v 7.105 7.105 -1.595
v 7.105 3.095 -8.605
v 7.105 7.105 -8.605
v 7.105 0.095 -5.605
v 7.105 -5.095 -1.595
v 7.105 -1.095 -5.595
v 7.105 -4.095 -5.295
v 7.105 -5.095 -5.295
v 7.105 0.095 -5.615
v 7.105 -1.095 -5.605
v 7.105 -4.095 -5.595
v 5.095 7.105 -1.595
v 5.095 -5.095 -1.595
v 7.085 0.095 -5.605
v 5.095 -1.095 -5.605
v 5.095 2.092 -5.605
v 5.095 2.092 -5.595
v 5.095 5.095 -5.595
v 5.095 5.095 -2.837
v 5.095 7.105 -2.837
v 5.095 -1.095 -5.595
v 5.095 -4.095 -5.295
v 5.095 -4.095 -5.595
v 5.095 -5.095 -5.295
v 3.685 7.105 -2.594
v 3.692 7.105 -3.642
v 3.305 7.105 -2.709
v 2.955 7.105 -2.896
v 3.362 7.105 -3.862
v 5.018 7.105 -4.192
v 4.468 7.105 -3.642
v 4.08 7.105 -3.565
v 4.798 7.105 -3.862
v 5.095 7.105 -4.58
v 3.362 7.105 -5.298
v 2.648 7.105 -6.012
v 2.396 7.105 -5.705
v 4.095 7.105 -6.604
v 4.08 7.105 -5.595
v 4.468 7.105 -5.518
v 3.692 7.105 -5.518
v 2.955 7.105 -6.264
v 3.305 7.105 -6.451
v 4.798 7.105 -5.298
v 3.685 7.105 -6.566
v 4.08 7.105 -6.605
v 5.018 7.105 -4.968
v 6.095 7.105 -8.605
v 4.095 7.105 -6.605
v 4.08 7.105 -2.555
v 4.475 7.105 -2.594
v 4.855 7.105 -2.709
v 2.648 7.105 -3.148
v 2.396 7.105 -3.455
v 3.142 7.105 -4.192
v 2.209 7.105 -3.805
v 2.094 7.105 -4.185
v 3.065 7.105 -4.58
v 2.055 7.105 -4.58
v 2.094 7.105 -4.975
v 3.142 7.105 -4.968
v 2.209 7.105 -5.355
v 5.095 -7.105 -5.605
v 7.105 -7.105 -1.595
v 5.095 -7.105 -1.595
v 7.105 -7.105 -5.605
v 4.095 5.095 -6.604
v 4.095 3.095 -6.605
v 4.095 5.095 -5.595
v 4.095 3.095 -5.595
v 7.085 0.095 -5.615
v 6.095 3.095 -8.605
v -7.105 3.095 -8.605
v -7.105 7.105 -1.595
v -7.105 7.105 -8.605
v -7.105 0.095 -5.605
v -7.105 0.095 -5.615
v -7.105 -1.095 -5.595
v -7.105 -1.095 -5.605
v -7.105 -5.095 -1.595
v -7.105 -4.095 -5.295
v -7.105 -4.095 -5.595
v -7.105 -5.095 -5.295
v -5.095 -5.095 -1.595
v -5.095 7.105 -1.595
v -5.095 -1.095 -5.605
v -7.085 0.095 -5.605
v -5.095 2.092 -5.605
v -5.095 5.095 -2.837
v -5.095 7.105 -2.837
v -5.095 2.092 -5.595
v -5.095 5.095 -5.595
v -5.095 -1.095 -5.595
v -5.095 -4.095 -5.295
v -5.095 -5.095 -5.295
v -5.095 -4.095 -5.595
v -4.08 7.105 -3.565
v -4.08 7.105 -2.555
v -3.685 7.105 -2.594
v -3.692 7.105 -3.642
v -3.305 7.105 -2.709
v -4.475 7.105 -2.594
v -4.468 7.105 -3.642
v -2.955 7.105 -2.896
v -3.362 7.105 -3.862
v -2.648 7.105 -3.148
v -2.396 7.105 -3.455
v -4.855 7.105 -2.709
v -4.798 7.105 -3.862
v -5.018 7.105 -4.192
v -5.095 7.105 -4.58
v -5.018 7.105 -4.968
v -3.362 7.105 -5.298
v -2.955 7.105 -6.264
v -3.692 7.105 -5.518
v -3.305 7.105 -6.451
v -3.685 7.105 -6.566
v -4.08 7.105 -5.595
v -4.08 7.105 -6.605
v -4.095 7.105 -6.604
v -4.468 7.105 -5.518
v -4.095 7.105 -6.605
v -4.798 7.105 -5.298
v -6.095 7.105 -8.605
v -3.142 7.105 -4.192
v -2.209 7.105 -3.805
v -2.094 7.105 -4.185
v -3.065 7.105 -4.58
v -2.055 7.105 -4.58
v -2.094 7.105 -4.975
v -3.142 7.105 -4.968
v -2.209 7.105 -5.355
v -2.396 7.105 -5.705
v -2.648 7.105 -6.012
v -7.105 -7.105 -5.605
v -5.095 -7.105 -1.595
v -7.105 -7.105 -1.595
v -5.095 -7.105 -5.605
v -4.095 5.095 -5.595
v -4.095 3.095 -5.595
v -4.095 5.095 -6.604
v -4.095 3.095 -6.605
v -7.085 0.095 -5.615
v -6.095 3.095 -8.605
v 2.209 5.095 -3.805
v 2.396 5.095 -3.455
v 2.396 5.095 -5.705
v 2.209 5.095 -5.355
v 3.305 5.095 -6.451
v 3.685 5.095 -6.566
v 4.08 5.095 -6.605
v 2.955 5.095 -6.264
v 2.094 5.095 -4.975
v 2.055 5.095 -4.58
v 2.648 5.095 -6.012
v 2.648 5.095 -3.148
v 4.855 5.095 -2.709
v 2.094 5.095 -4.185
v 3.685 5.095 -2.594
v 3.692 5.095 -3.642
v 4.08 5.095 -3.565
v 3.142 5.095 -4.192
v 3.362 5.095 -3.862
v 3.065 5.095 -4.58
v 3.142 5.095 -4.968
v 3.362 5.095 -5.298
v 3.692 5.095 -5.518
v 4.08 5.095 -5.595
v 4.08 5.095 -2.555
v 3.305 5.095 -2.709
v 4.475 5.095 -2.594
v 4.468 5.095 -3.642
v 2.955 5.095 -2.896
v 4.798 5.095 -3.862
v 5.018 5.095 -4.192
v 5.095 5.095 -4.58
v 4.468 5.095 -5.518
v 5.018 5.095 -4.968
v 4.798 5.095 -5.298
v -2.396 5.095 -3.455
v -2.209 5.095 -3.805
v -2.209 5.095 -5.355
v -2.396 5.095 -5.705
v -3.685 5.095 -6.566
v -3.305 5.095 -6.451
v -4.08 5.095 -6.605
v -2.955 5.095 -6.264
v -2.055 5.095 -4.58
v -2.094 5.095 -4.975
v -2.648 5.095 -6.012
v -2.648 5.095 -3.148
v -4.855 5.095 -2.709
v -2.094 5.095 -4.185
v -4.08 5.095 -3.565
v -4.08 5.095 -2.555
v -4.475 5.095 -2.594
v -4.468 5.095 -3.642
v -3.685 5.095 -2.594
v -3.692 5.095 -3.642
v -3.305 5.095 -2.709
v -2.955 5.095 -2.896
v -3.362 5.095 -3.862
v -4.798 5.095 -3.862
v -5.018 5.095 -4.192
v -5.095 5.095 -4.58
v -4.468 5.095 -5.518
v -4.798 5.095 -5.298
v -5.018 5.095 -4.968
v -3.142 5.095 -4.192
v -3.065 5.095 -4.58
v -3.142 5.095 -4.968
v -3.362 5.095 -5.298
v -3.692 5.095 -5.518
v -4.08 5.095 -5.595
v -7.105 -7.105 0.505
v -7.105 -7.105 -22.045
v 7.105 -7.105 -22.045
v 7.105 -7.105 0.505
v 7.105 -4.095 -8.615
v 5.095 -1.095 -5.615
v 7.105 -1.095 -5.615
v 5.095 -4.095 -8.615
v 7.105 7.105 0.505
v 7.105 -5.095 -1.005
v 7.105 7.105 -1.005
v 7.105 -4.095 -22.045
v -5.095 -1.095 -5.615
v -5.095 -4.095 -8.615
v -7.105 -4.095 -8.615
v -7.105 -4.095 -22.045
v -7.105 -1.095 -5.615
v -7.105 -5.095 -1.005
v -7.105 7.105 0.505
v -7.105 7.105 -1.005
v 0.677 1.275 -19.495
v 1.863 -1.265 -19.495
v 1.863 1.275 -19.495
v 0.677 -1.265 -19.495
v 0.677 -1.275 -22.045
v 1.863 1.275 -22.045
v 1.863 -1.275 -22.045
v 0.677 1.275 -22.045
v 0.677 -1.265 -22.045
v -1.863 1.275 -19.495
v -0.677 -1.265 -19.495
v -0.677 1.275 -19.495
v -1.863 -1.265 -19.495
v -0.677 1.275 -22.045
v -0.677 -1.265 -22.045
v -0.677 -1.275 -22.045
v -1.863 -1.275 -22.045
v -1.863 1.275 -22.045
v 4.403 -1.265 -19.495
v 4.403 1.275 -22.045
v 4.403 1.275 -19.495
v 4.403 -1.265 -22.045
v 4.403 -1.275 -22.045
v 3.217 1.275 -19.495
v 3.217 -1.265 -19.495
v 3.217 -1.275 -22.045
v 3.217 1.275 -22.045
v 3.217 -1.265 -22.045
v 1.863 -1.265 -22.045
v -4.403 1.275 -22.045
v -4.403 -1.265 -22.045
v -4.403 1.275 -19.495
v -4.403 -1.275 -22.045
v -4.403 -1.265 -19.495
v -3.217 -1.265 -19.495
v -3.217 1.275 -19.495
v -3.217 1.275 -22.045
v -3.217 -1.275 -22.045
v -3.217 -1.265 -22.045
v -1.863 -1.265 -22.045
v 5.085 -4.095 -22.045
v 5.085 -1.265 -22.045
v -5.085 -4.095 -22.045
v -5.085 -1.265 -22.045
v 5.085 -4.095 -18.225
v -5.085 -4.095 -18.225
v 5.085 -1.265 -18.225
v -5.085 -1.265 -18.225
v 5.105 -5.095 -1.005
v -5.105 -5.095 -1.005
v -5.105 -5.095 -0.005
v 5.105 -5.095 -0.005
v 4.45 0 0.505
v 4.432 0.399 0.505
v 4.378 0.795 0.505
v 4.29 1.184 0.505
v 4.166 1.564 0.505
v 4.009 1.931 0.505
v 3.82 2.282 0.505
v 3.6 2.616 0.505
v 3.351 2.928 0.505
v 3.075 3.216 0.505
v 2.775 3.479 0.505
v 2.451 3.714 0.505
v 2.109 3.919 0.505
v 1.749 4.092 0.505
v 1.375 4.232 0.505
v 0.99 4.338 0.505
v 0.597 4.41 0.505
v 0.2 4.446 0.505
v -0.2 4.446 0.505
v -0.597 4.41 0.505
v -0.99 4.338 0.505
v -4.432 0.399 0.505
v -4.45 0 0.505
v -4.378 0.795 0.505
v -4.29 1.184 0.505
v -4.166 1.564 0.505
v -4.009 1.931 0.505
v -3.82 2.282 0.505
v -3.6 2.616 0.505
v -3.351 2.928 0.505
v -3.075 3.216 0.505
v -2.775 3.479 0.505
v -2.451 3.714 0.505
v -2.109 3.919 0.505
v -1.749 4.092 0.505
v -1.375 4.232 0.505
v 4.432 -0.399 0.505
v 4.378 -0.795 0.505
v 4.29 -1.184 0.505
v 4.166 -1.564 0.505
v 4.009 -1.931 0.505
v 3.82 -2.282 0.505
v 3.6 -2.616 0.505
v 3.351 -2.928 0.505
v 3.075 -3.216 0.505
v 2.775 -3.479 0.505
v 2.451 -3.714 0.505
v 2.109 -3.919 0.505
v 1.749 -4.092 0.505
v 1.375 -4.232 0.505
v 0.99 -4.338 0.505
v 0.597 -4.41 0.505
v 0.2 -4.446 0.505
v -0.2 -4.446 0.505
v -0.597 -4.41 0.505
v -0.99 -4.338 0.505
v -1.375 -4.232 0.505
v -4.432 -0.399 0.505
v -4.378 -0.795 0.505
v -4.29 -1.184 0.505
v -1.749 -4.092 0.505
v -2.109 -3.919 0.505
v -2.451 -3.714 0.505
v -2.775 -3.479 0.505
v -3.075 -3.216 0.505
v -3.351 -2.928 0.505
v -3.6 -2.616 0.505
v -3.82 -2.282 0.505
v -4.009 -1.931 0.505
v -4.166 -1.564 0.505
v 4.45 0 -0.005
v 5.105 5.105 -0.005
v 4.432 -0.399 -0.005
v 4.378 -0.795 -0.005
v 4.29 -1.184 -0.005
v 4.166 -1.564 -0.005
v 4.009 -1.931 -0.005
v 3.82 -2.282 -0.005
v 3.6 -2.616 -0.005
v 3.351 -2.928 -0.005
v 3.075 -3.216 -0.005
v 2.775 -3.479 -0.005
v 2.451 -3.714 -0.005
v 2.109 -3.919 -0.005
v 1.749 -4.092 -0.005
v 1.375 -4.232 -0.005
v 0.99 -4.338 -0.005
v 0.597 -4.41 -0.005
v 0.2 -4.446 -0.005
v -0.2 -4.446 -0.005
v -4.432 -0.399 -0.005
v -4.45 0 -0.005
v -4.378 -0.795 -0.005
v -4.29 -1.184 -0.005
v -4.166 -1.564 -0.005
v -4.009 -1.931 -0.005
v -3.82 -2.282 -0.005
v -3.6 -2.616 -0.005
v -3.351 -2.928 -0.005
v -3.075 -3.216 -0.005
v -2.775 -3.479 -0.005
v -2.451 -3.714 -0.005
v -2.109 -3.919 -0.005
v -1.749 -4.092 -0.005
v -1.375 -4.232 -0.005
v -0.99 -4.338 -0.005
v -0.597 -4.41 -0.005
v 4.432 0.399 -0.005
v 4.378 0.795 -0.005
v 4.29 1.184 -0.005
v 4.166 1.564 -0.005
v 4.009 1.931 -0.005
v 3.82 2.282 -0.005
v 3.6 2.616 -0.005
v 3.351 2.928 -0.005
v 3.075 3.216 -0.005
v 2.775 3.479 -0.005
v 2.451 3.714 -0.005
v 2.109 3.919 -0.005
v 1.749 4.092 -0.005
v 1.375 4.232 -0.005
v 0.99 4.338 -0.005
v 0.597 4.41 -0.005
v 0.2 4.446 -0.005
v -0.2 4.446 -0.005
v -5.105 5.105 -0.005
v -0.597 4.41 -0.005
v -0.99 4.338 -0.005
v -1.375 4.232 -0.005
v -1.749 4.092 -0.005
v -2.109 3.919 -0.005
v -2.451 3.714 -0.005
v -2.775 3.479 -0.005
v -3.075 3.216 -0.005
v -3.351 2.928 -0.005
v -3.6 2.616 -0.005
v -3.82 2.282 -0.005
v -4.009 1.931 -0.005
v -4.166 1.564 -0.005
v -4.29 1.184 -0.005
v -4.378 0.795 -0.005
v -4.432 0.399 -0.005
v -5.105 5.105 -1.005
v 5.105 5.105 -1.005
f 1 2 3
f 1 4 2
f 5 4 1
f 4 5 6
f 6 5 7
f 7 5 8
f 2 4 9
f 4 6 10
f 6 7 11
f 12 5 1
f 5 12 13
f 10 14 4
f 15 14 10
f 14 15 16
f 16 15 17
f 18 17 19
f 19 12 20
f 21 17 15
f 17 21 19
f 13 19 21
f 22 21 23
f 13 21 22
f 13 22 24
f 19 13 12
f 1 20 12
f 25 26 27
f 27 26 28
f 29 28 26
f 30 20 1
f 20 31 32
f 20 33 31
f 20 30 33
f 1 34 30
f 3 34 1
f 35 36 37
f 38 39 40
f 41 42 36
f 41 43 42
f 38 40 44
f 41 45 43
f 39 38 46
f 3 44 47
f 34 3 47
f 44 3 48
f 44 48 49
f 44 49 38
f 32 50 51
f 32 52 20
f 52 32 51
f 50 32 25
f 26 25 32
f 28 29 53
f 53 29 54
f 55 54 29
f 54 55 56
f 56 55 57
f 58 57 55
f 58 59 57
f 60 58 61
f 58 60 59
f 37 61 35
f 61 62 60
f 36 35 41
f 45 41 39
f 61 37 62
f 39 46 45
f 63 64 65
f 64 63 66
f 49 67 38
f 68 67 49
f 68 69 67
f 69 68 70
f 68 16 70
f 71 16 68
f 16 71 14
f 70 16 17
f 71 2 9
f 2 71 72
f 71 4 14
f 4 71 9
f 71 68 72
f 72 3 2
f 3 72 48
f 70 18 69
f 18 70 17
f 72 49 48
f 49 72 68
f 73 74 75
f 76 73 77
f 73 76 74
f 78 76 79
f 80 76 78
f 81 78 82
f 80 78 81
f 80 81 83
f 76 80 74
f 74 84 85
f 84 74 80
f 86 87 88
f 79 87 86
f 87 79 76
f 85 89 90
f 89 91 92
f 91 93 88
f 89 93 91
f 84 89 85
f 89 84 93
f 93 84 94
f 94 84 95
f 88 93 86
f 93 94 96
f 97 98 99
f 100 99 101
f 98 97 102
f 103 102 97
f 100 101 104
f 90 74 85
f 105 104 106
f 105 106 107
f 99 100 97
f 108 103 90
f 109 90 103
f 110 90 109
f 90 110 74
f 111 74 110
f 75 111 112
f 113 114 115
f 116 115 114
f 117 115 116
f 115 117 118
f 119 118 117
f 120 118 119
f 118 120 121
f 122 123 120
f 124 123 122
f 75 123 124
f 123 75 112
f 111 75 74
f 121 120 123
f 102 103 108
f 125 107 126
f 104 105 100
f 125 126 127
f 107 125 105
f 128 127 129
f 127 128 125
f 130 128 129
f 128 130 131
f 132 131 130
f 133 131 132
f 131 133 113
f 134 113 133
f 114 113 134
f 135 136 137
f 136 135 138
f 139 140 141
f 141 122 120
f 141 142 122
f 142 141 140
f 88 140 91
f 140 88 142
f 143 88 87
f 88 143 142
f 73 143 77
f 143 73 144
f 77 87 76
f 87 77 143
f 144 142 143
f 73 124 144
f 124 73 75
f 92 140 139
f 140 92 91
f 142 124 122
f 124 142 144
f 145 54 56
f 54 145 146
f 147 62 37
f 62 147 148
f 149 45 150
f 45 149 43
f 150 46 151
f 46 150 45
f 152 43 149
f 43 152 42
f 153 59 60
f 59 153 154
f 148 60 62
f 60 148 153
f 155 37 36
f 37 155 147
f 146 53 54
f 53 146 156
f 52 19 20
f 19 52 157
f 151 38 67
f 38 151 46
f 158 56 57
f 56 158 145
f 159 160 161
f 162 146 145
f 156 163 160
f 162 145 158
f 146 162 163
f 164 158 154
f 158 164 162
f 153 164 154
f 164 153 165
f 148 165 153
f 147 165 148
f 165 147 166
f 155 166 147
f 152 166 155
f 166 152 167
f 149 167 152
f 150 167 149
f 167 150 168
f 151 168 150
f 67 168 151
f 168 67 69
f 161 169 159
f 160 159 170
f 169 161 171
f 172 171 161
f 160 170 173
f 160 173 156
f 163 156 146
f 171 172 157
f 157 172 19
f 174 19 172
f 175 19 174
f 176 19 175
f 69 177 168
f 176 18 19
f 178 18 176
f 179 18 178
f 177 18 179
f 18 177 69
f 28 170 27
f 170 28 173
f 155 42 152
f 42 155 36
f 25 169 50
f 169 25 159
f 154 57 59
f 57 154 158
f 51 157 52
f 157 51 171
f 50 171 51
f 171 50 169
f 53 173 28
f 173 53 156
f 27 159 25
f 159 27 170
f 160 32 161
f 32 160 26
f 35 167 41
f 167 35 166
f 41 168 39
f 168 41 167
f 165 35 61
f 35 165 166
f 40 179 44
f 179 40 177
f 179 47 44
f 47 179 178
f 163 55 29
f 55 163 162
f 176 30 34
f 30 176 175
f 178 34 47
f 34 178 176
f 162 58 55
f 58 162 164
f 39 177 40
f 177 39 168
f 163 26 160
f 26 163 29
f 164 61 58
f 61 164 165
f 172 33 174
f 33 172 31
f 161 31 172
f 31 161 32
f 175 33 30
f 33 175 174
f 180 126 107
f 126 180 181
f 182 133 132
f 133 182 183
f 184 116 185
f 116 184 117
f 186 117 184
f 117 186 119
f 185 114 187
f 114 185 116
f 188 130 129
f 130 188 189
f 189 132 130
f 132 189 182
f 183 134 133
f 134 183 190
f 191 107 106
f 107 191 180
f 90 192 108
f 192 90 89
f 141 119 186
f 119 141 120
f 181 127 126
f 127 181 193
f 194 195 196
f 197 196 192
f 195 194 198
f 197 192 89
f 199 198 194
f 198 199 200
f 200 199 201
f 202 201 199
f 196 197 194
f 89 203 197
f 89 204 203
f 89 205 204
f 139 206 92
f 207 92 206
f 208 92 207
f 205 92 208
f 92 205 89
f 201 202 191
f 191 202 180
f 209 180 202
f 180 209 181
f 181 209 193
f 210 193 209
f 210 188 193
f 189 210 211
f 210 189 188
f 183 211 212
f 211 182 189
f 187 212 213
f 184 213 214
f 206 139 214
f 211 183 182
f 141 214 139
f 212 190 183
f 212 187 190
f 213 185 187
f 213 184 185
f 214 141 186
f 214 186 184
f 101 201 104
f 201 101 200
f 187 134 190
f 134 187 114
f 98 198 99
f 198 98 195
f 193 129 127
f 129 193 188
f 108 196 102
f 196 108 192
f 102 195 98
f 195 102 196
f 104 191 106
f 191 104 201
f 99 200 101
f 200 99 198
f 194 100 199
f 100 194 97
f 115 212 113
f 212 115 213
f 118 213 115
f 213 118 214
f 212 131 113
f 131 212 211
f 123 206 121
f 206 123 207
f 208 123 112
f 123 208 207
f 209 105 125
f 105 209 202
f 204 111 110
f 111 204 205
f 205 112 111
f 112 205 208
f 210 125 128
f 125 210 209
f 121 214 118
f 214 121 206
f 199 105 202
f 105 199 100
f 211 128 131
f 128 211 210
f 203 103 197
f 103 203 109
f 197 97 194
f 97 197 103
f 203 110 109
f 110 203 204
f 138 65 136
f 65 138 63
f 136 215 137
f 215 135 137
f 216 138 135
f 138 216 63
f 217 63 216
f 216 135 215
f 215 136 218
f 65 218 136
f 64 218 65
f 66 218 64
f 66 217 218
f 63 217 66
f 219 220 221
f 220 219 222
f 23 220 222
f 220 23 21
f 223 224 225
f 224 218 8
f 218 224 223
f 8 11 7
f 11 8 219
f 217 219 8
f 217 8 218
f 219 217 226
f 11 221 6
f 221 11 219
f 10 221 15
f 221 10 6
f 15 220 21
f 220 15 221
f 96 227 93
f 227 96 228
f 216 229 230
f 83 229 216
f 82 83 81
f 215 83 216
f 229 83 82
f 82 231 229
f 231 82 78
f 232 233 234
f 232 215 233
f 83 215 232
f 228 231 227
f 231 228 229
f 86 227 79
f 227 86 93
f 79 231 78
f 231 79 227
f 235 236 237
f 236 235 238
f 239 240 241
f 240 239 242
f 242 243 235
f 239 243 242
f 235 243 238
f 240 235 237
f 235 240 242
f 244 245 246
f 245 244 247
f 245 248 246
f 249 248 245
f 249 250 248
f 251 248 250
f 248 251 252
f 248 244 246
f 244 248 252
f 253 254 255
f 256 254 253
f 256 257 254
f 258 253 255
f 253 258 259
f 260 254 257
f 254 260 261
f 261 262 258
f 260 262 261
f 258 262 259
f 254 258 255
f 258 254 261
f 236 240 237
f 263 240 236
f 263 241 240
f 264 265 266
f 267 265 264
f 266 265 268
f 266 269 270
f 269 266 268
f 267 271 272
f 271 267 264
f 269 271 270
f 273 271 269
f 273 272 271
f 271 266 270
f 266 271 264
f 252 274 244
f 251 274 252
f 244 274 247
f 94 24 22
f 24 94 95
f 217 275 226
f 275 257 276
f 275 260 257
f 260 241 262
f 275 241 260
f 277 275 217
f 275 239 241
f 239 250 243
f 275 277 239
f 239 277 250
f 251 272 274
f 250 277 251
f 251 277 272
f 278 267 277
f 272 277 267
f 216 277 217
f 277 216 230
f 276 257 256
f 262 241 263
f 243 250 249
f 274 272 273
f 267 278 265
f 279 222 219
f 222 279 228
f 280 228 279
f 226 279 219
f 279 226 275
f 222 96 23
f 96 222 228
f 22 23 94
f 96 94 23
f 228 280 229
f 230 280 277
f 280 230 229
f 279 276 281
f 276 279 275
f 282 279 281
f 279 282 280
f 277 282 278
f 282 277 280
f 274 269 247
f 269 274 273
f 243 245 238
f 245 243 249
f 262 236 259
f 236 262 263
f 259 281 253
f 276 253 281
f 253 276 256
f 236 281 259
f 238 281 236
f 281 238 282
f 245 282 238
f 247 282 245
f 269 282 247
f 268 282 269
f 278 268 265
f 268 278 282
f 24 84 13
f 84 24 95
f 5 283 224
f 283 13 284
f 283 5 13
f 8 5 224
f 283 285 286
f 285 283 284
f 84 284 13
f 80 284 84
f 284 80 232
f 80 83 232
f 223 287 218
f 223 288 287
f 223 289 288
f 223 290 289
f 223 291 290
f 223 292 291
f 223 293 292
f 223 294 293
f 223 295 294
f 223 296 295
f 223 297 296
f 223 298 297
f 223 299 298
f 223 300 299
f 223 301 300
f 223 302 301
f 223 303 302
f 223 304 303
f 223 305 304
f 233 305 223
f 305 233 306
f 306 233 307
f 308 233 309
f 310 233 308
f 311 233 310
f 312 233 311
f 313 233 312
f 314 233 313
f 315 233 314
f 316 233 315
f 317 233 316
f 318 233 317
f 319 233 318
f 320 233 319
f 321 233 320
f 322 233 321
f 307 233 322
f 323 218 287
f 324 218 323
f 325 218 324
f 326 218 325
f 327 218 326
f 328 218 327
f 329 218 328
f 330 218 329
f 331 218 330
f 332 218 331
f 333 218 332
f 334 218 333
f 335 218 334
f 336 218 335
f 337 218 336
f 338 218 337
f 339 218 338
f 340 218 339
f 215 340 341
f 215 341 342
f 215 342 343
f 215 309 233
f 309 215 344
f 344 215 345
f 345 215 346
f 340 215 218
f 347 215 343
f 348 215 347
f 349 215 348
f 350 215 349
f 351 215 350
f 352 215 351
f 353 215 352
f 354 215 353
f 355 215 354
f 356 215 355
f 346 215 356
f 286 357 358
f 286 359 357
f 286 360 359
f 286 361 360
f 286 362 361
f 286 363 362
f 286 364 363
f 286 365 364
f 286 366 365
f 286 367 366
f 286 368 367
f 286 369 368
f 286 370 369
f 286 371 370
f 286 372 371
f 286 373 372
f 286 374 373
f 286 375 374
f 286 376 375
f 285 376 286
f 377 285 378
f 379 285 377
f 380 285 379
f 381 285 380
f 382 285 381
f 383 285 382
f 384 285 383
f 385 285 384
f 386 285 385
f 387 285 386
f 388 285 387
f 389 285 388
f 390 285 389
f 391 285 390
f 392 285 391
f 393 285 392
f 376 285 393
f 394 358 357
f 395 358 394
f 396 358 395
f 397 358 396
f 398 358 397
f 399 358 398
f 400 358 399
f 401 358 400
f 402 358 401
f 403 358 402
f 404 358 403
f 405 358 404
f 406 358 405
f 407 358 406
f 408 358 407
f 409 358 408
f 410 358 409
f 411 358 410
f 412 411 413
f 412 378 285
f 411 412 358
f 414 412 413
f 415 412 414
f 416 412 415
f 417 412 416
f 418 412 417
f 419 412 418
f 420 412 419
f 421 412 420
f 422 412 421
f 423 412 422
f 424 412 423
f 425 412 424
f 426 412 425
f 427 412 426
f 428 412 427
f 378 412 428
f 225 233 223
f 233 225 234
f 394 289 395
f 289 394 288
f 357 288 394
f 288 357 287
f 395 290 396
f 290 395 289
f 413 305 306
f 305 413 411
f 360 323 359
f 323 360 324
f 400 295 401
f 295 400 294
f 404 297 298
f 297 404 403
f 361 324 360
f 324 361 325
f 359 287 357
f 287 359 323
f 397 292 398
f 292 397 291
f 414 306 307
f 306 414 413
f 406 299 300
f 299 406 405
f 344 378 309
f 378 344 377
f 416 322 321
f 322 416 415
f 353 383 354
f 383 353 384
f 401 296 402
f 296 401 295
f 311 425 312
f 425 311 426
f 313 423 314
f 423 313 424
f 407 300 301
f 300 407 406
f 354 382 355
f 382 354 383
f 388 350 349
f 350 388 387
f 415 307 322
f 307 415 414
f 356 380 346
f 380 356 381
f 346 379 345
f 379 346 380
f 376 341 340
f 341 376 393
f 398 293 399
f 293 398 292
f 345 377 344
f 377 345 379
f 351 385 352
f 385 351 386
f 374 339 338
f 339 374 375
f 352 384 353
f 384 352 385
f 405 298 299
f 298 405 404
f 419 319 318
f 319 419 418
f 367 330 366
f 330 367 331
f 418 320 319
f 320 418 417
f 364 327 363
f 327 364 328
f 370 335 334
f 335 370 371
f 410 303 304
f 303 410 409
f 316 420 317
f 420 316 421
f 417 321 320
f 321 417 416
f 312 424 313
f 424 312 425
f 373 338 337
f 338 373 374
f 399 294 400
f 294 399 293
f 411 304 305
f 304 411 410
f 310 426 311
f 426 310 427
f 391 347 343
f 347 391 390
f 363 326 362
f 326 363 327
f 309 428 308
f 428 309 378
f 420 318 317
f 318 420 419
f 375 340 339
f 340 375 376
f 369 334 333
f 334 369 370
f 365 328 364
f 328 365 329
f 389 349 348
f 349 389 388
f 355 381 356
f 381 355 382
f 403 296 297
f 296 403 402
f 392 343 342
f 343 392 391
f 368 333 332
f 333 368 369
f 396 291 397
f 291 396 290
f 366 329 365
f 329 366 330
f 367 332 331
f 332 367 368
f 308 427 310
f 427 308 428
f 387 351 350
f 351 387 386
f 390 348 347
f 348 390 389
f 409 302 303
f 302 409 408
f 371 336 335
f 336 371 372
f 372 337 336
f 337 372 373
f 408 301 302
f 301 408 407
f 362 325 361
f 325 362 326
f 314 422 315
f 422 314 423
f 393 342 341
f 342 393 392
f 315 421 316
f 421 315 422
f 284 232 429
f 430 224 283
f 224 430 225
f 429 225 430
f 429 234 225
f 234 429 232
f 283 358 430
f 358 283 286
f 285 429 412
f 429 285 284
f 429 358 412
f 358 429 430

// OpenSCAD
// file: vector_operations.scad
/*

    Make up for the lack of common vector operations.

    Usage:

        use <vector_operations.scad>

*/

module end_of_customization() {}

show_name = false;
if (show_name) {
    linear_extrude(2) text("vector_operations.scad", halign="center");
}

// Cumulative sum of values in v
function v_cumsum(v) = [for (a = v[0]-v[0], i = 0; i < len(v); a = a+v[i], i = i+1) a+v[i]];
    
function v_sum(v, i=0, r=0) = i<len(v) ? v_sum(v, i+1, r+v[i]) : r;

function v_add_scalar(v, s) = [ for (e = v) e + s ];
    
function v_sub_scalar(v, s) = [ for (e = v) e - s ];
    
function v_mul_scalar(v, s) = [ for (e = v) e * s ];

// The add operation is reasonably as the + operator in the language itself. 
 

function a2_add_scalar(a, s) = [ for (ae = a) v_add_scalar(ae, s) ];

// Array should be rectangular, with the same number
// of elements in each contained list.  
// That makes it different from a generic C style lists of list.
function array_transpose(a) = 
    [ for (j = [0 : 1 : len(a[0])-1]) 
        [ for (i =[0 : 1 : len(a)-1])
          a[i][j]  
        ]
    ];
        
        
module test_array_transpose() {
    a = [["cat1", "dog1"],
         ["cat2", "dog2"]]; 
    * echo("a", a);
    * echo("aT", array_transpose(a));
}

* test_array_transpose();

//Hadamard Product - - a & b must be same dimensioon
function v_o_dot(v_a, v_b) = 
    assert(len(v_a) == len(v_b), str("len(v_a)=", len(v_a), "len(v_b)=", len(v_b)))
    [ for (i = [0 : len(v_a)-1]) v_a[i] * v_b[i] ];


         
// file: centerable.scad
use <vector_operations.scad>


function bw_lshift(number, places) = 
    number * pow(2, places);
    
function bw_rshift(number, places) = 
    floor(number / pow(2, places));
    
function bw_extract(number, places, bits) = 
    bw_rshift(number, places) % pow(2, bits);

// A bit less brain-damaged primative shapes

CENTER = 0;   
PLUS = 1;
MINUS = 2;

FRONT = 1;
BEHIND = 2; 
RIGHT = 4;
LEFT =  8;    
ABOVE = 16;
BELOW = 32;
SIDEWISE = 64;

X_AXIS = 128;
Y_AXIS = 256;
Z_AXIS = 512;

_X_BITS = [0, 2];
_Y_BITS = [2, 2];
_Z_BITS = [4, 2];
_O_BITS = [6, 1];

_XYZO_BITMAP = [_X_BITS, _Y_BITS, _Z_BITS, _O_BITS];

function _number_to_bitvector(number) = [ 
    for (i = [0:3]) let(places = _XYZO_BITMAP[i][0], bits = _XYZO_BITMAP[i][1]) 
       bw_extract(number, places, bits) 
];
    

function _bv_to_sign(bv) = [
    for (i = [0:len(bv)]) 
        bv[i] == PLUS ? 1 :
        bv[i] == MINUS ? -1 : 0
];
    

function _center_to_dv(center, s, bv) = [
    for (i = [0:len(s)-1]) s[i] * bv[i]
];
    
function _center_to_displacement(center, size) = 
    _center_to_dv(
        center, 
        v_mul_scalar(size, 0.5),
        _bv_to_sign(_number_to_bitvector(center))); 

function _rotation_to_angles(angles) = 
    let(
         bv = v_shorten(_number_to_bitvector(angles), 3),
         signs = _bv_to_sign(bv),
         // signs = [FRONT|BEHIND, RIGHT|LEFT, ABOVE|BELOW]
         // A sign of zero for FRONT|BEHIND is treated as FRONT
         rotation = 
            [0, 0, signs[0] == 1 ? 0 :  signs[0] == -1 ? 180: 0] + 
            v_mul_scalar([0, 0, 90], signs[1]) + 
            v_mul_scalar([0, -90, 0], signs[2])
    )
    rotation;

function _rotate_size(size, rotation) =
    is_undef(rotation) ? size :
    rotation==LEFT ? [size.y, size.x, size.z] :
    assert(false);


module center_translation(size, center, rotation) {
    size_for_disp = _rotate_size(size, rotation); 
    disp = _center_to_displacement(center, size_for_disp);
    translate(disp) { 
        children();
    }
}

module center_rotation(rotation) {
    angles = _rotation_to_angles(rotation);
    rotate(angles) {
        children();
    }

}

module center_rotate(from_axis, to_axis) {
    assert(from_axis == Z_AXIS, "Not implemente yet");
    rotation =
       to_axis == X_AXIS ? [0, -90, 0] :
       to_axis == Y_AXIS ? [0, 0, 0] :
       to_axis == Z_AXIS ? [0, 0, 0] :
       assert(false);
       


    rotate(rotation) {
        children();
    }
}


module center_reflect(v) {
    assert(!is_undef(v), "You must pass an mirroring argument to center_reflect()");
    children();
    mirror(v) children();
}


function center_str_to_center(center_as_str) = 
    center_as_str == "RIGHT" ? RIGHT :
    center_as_str == "LEFT" ? LEFT :
    center_as_str == "FRONT" ? FRONT :    
    center_as_str == "BEHIND" ? BEHIND :
    center_as_str == "ABOVE" ? ABOVE :
    center_as_str == "BELOW" ? BELOW :
    assert(false, "Not implemented");
  
// file: logging.scad
/*

Features:
    * Larger font size since the console window font size can't be changed from GUI.
    * Color coding of message.
    * Prettier printing of vectors by rows..
    * Control of output level from customizer
    * Structured to encourage labeling output.

Usage:

include <lib/logging.scad>

The logging level constants are:

*/

CRITICAL = 50 + 0; 
FATAL = CRITICAL + 0;
ERROR = 40 + 0;
WARNING = 30 + 0;
WARN = WARNING + 0;
INFO = 20 + 0;
DEBUG = 10 + 0;
NOTSET = 0 + 0;

/*

    
Add this to your customizer section:   

*/

/* [Logging] */

log_verbosity_choice = "INFO"; // ["WARN", "INFO", "DEBUG"]
verbosity = log_verbosity_choice(log_verbosity_choice);    

/*  

Sample usage in code: 
    // DEBUG level assigned by default!
    log_s("air_brush_length", air_brush_length, verbosity);  
    
    // Really show this message because its important for immediately debugging
    log_s("air_brush_length", air_brush_length, verbosity, IMPORTANT);
   
    // Info message for aid in isolating a problem:
    log_s("Entering module", "module_name", verbosity, INFO);
    
    // Not a fatal error, but something the user should immediately 
    // spot in the log:
    log_s("Warning", "Message about the worry!", verbosity, WARN);
    
    // Show an array with somewhat prettier printing:
    log_v1("offsets", offsets, verbosity);
    
    // Dump out information relevant to an assertion failure
    if (assertion_condition) {
        log_v1("offsets", offsets, verbosity), ERROR);
        assert(assertion_condition, "msg")
    }
    
    warn(
        lp >= 2.5*h, 
        
        "Pintle length should be at least 2.5 times the height.",
        "The length is not sufficient to correctly implement rotation stops."
    );
    
*/


module end_of_customization() {}




show_name = false;
if (show_name) {
    linear_extrude(2) text("logging.scad", halign="center");
}


IMPORTANT = 25 + 0;


function console_styling(level) =
    level >= WARNING ?
        "<b style='background-color:LightSalmon'><font size='+1'>" : 
    level >= IMPORTANT ? 
        "<b style='color:OrangeRed'><font size='+2\'>" :
    // otherwise
        "<font size=\"+2\">";

function log_verbosity_choice(choice) = 
    choice == "WARN" ? WARN :
    choice == "INFO" ? INFO : 
    choice == "DEBUG" ? DEBUG : 
    NOTSET;
 
 
function log_s(label, s, verbosity, level=DEBUG, important=0) = 
    let(
        overridden_level = max(level, important),
        style = console_styling(overridden_level), 
        dmy1 = overridden_level >= verbosity ? echo (style, label, s) : undef
        
    )
    undef;
    
    
module log_s(label, s, verbosity, level=INFO, important=0) {
    overridden_level = max(level, important);
    if (overridden_level >= verbosity) { 
        style = console_styling(overridden_level);
        echo(style, label, s);
    }
}


function log_v1_styled(label, v1, style_level) = 
    let (
        style = console_styling(style_level),
        dummy1 = echo(style, "---"),
        dummy2 = echo(style, label, "= ["),
        dummy3 = [for (v = v1) echo(style, "-........", v)],
        dummy4 = echo(style, "-------]")
    )
    undef;


function log_v1(label, v1, verbosity, level=INFO, important=0) =
    let (
        overridden_level = max(level, important),
        dummy = overridden_level >= verbosity ? log_v1_styled(label, v1, overridden_level) : undef
    )
    undef;


module log_v1(label, v1, verbosity, level=INFO, important=0) {
    overridden_level = max(level, important);
    if (overridden_level >= verbosity) { 
        style = console_styling(overridden_level);
        echo(style, "---");
        echo(style, label, "= [");
        for (v = v1) {
            echo(style, "-........", v);
        }
        echo(style, "-------]");
        echo(style, " ");
    }
} 


module warn(condition, condition_as_text, warning, consequence) {
    if (!condition) {
        // Quick and dirty implementation!
        log_s(condition_as_text, warning , INFO, level=WARNING);
        log_s("Consequence", consequence, INFO, level=WARNING);
    }
}
// main file
/*

use <potentiometer_mounting.scad>

*/

include <logging.scad>
include <centerable.scad>
use <shapes.scad>

/* [Customization] */
    show_housing = true;
    show_default = false;
    allowance_ = 0.3; // [0:0.05:2]
    clip_overlap_ = 1; // [0:0.05:1]
    clip_thickness_ = 1.; // [0:0.25:4]
    count_ = 1; // [1: 10]
    spacing_ = 2; // [0 : 1 : 20]
    show_mocks_= false;
    build_from_ = 0; //[0:Designed, 1:From face, 2:Side, 3:End]
    retain_pins_ = true;
    arrow_up_ = true;
    spring_width_ = 4.;
    
    if (show_housing) {
        breadboard_compatible_trim_potentiometer_housing(
            count = count_, 
            spacing = spacing_, 
            allowance = allowance_,
            clip_overlap = clip_overlap_,
            clip_thickness = clip_thickness_,
            spring_width = spring_width_,
            build_from = build_from_,
            arrow_up = arrow_up_,
            show_mocks = show_mocks_,
            retain_pins = retain_pins_);
    }

    if (show_default) {
        breadboard_compatible_trim_potentiometer_housing();
    }

module end_of_customization() {}

// Rotations:  Move to centrable???
Z_TO_MINUS_Z = [180, 0, 0];
Z_TO_MINUS_Y = [90, 0, 0];
Z_TO_X = [0, 90, 0];
X_TO_Y = [0, 0, 90];

// Potentiometer Constants
PEDISTAL_IDX = 0;
KNOB_IDX = 1;
 
D_BASE = 0;
H_BASE = 1;
D_TAPER= 2;
D_INDICATER = 3;
H_INDICATER = 4;
 
 function breadboard_compatible_trim_potentiometer_dimensions() =
    let (
        pedistal = [9.6, 9.6, 5.0],
        knob = [7.89, 3.81, 7.48, 6.47, 1.39],
        last = undef
    )
    [ pedistal, knob ];
 
 module breadboard_compatible_trim_potentiometer(alpha=1) {
    // Center of origin at the centerline of the knob where the knob meets the base.  
    // The default orientation is for the knob to rotate along the z-axis.
    dims = breadboard_compatible_trim_potentiometer_dimensions();
    color("SteelBlue", alpha=alpha) {
        pedistal();
        knob();
    }
     
    module pedistal() {
         block(dims[PEDISTAL_IDX], center=BELOW); 
    }
    
    module arrow() {
        linear_extrude(4) {    
            text("\u2191", font="DevaVu Sans Mono", halign="center", valign="center", size = 5);
        }
    }
    module knob() {
        dim = dims[KNOB_IDX];
        can(d=dim[D_BASE], h=dim[H_BASE], taper=dim[D_TAPER], center=ABOVE);
        translate([0, 0, dim[H_BASE]]) {
            render() difference() {
                can(d=dim[D_INDICATER], h=dim[H_INDICATER], center=ABOVE);
                arrow();
            }
        }
    }
}


// Housing Constants
BODY_IDX = 0;
X_OFFSET_IDX = 1;
DX_IDX = 2;
FACE_PLATE_IDX = 3;
PIN_RETENTION_BASE_IDX = 4;
PIN_RETENTION_LOWER_WALL_IDX = 5;
PIN_WIDTH = 6;
PIN_LENGTH = 7;
PIN_WIRE_FIN = 8;
PIN_WIRE_GAP = 9;
D_KNOB_CLEARANCE = 10;
BACK_PLATE = 11;
HOUSING = 12;

 
function  breadboard_compatible_trim_potentiometer_housing_dimensions(
        wall = 2, 
        face = 0.5, 
        back = 1, 
        count = 1, 
        spacing = 2, 
        allowance = 0.3, 
        clip_overlap = 1.0, 
        clip_thickness = 1.0) =
    let(
        knob_dims = breadboard_compatible_trim_potentiometer_dimensions(),
        pedistal = knob_dims[PEDISTAL_IDX],
        allowances = [2*allowance, 2*allowance, 2*allowance],
        walls = [2*wall, 2*wall, 0],
        housing = pedistal+allowances+walls,
        x = (housing.x - wall) * count + spacing * (count-1) + wall,
        y = pedistal.y + 2 * allowance + 2 * wall,
        z = pedistal.z + allowance,
        dx = housing.x - wall + spacing,
        back_plate = [x, y, back],
        body = [x, y, z],
        x_offset = -body.x/2 + wall + allowance + pedistal.x/2,
        
        face_plate = [body.x, body.y, face],
        pin_length = 14,
        pin_length_allowance = 0.2,
        pin_width = 2.54,
        clip_thickness = pin_width,
        pin_retention_base = [housing.x, wall+clip_overlap, pin_length + pin_length_allowance + clip_thickness], 
        pin_retention_lower_wall = [
            4*pin_width, 
            body.y/2 - pin_width/2, 
            1.5*clip_thickness
        ],
        wire_gap = 1.24 * 1.1,
        wire_fin = [pin_width - wire_gap, pin_width, clip_thickness],
        knob_allowance = 0.50,
        d_knob_clearance = knob_dims[KNOB_IDX][D_BASE] + 2*knob_allowance,
        last = undef
    ) 
    [
        body, 
        x_offset, 
        dx, 
        face_plate, 
        pin_retention_base, 
        pin_retention_lower_wall,
        pin_width, 
        pin_length, 
        wire_fin,
        wire_gap,
        d_knob_clearance,
        back_plate, 
        housing,
    ];
    
// Build orientation Constants
BUILD_UP_TO_FACE = 0; // As designed, with no rotation 
BUILD_FROM_FACE = 1;    
BUILD_FROM_SIDE = 2;
BUILD_FROM_END = 3; 
 
 module breadboard_compatible_trim_potentiometer_housing(
        wall = 2, 
        face = 0.5,
        back = 1, 
        count = 1, 
        spacing = 2, 
        allowance = 0.3, 
        clip_overlap = 0.5,
        clip_thickness = 1.0,
        spring_width = 3, 
        center = 0, 
        build_from = 0,
        retain_pins = false,
        arrow_up = true,
        show_mocks = false) {
            
          
            
    dims = breadboard_compatible_trim_potentiometer_housing_dimensions(wall, face, back, count, spacing, allowance, clip_overlap);
    knob_dims =  breadboard_compatible_trim_potentiometer_dimensions();
    pedistal = knob_dims[PEDISTAL_IDX];
    body = dims[BODY_IDX];
    face_plate = dims[FACE_PLATE_IDX];
    back_plate = dims[BACK_PLATE];
    pin_retention_base = dims[PIN_RETENTION_BASE_IDX];
    pin_retention_lower_wall = dims[PIN_RETENTION_LOWER_WALL_IDX];
    wire_fin = dims[PIN_WIRE_FIN]; 
    pin_width = dims[PIN_WIDTH];
    pin_length = dims[PIN_LENGTH];
    wire_gap = dims[PIN_WIRE_GAP];
    d_knob_clearance = dims[D_KNOB_CLEARANCE];
    housing = dims[HOUSING];
    
    orient() assembly();
    
    module assembly() {
        
        replicate() {
            if (show_mocks) {
                orient_mocks(arrow_up) {
                    breadboard_compatible_trim_potentiometer();
                    dupont_pins();
                }
            } 
            spring_clip();

            housing_lower_xz_wall(narrow=false);
            
            if (retain_pins) {
                pin_retention_clip(arrow_up);
            }
        } 
    
        render() difference() {
            block(face_plate, center=ABOVE);
            replicate() knob_clearance();
        }    
                
        render() difference() {
            block(back_plate, center=BELOW);
            replicate() pedistal_clearance();
        }
        three_d_printing_aids();
    }
    
    module three_d_printing_aids() {
        if (build_from == BUILD_FROM_END) {
            build_from_end_printing_aids();
        }
    }
    
    module build_from_end_printing_aids() {
        bridging_pillar = [body.x, 2*allowance, 2*allowance];
        // Bridging supports for top of housing and retention clips
        top_wall_pillar = [body.x, wall, wall];
        center_reflect([0, 1, 0]) {
            translate([0, body.y/2, -housing.z]) block(top_wall_pillar, center=LEFT+ABOVE);
        }

        module pin_supports() {
            // Bridging supports for pin wire fins
            bridging_pillar = [body.x, 2*allowance, 2*allowance];
            t_fins_o = [0, pin_width/2, -body.z - pin_retention_base.z];
            translate(t_fins_o) block(bridging_pillar);
            t_fins_i = [0, pin_width/2, -body.z - pin_retention_base.z + pin_width];
            translate(t_fins_i) block(bridging_pillar);   
       
            t_lw_o = [
                0, 
                -body.y/2+pin_retention_lower_wall.y-allowance,  
                -body.z - pin_retention_base.z + allowance
            ];
            #translate(t_lw_o) block(bridging_pillar);
            t_lw_i = [
                0, 
                -body.y/2+pin_retention_lower_wall.y-allowance, 
                -body.z - pin_retention_base.z +  pin_retention_lower_wall.z - allowance
            ];
            translate(t_lw_i) block(bridging_pillar);             
        }        
    }

    module dupont_pins() {
        color("black") {
            translate([pin_width, 0, -pedistal.z]) block([pin_width, pin_width, pin_length], center=BELOW);
        }
        color("red") {
            translate([-pin_width, 0, -pedistal.z]) block([pin_width, pin_width, pin_length], center=BELOW);
        }  
        color("yellow") {
            angle = arrow_up ? 5 : 0;
            translate([0, -pin_width/2, -pedistal.z]) 
                rotate([angle, 0, 0]) 
                    block([pin_width, pin_width, pin_length], center=BELOW);
        }            
    }  

    module housing_lower_xz_wall(narrow = true) {
        xz_wall = narrow ? [housing.x, wall, wall] : [housing.x, wall, housing.z];
        translate([0, -housing.y/2, -housing.z]) block(xz_wall, center=ABOVE+RIGHT); 
    }
    
    module spring_clip() {
        lower_spring_clip();
        upper_spring_clip();
        spring_support();
    }
    
    module upper_spring_clip() {
        t_housing_corner = [housing.x/2, housing.y/2, -housing.z];
        d_snap_ring_hole = 1.44 + 0.6; // measured plus allowance
        snap_ring_wall = 1;
        t_snap_ring_hole = [-wall+snap_ring_wall, 0, -clip_overlap];
        center_reflect([1, 0, 0]) {
            translate(t_housing_corner) {
                translate(t_snap_ring_hole) {
                    rod(
                        d=d_snap_ring_hole+2, 
                        l=wall, 
                        hollow = d_snap_ring_hole, 
                        center=SIDEWISE+ABOVE+BEHIND+LEFT);
                }
            }
        }
    }

    module lower_spring_clip() {
        spring();
        module clip() {
            ramp_length = 3;
            catch = [
                wall + clip_overlap, 
                4, 
                clip_thickness
            ];
            ramp = [
                wall/2, 
                catch.y, 
                ramp_length
            ]; 
            
            print_support = [
                0.01, 
                ramp.y + ramp_length, 
                0.01
            ];           
            hull() {
                block(catch, center=BELOW+BEHIND+LEFT);
                block(ramp, center=BELOW+BEHIND+LEFT);
                block(print_support, center=BELOW+BEHIND+LEFT);
            }
        }
        
        module spring() {
            t_housing_corner = [housing.x/2, housing.y/2, -housing.z];
            spring = [wall, housing.y, spring_width];
            center_reflect([1, 0, 0]) {
                translate(t_housing_corner) {
                    block(spring, center=ABOVE+LEFT+BEHIND);
                    clip();
                }
            }
        } 
    }

    module knob_clearance() {
        can(d=d_knob_clearance, h=20);
    }
     
    module pedistal_clearance() {
        allowances = [2*allowance, 2*allowance, 20];
        translate([0, 0, -pedistal.z/2]) block(pedistal + allowances);
    }
    
    module pin_retention_clip_up() {
        module wire_clip() {
            translate([0, 0, -body.z-pin_retention_base.z])
                center_reflect([1, 0, 0]) 
                    translate([wire_gap/2, 0, 0]) 
                        block(wire_fin, center=ABOVE+FRONT); 
        }
            
        
        translate([0, -body.y/2, -body.z]) block(pin_retention_base, center=BELOW+RIGHT);
        translate([0, -body.y/2, -body.z-pin_retention_base.z]) block(pin_retention_lower_wall, center=ABOVE+RIGHT);
        wire_clip();
        center_reflect([1, 0, 0]) translate([pin_width, 0, 0]) wire_clip();        
    }
    
    module pin_retention_clip_sidewise() {
        pin_floor_thickness = 1.5;
        t_bottom_cl = [
            0, 
            -housing.y/2,
            -housing.z
        ];
        pin_floor = [
            4 * pin_width, 
            pin_floor_thickness,
            pin_length + pin_width/2
        ]; 
        translate(t_bottom_cl) block(pin_floor, center=BELOW+RIGHT);
        support_width = pin_width;
        t_bottom_pin = t_bottom_cl + [0, pin_floor_thickness, - (pin_length - pin_width/2)];
        lower_pin_support = [pin_width, 1.8, support_width];
        mid_pin_support = [pin_width, lower_pin_support.y + pin_width, support_width];
        side_pin_support = [pin_width/2, mid_pin_support.y + 2* pin_width, support_width];
        
        translate(t_bottom_pin) {
            block(lower_pin_support, center=ABOVE+RIGHT);
            translate([pin_width, 0, 0]) block(mid_pin_support, center=ABOVE+RIGHT);
            translate([pin_width, 0, 0]) block(side_pin_support, center=ABOVE+RIGHT+FRONT);
            translate([-pin_width, 0, 0]) block(side_pin_support, center=ABOVE+RIGHT+FRONT);
            
        }
    }
    
    module spring_support() {
        echo("Got here");
        support_height = 6;
        spring_support_upper = [
            wall, 
            support_height,
            0.01
        ];
        spring_support_lower = [
            wall,
            0.01,
            support_height,
            
        ];
        t_corner = [
            housing.x/2,
            -housing.y/2,
            -housing.z
        ];
        center_reflect([1, 0, 0]) {
            translate(t_corner) {
                hull() {
                    #block(spring_support_upper, center=BELOW+RIGHT+BEHIND);
                    block(spring_support_lower, center=BELOW+RIGHT+BEHIND);
                }
            }
        }
        spring_support_floor = [
            housing.x,
            wall, 
            support_height
        ];
        translate(t_corner) block(spring_support_floor, center=BELOW+RIGHT+BEHIND);
        
    }
    
    module pin_retention_clip(arrow_up) {
        
        if (arrow_up) {
            pin_retention_clip_up();
        } else {
            pin_retention_clip_sidewise();
        }     
    }    
    
    module orient() {
        assert(build_from <=4);
        rotation = [[0, 0, 0], Z_TO_MINUS_Z, Z_TO_MINUS_Y, Z_TO_X][build_from];
        rotate(rotation) { 
            children();
        }
    } 
 
    module orient_mocks(arrow_up) {
        rotation = arrow_up ? [0, 0, 0] : [0, 0, 90];
        rotate(rotation) { 
            children();
        }
    }
    
    module replicate() {
        dx = dims[DX_IDX];
        x_offset = dims[X_OFFSET_IDX];
        for (i = [0 : count-1] ) {
            translate([i * dx + x_offset, 0, 0]) {
                children();
            }
        }           
    }  
    
 }
